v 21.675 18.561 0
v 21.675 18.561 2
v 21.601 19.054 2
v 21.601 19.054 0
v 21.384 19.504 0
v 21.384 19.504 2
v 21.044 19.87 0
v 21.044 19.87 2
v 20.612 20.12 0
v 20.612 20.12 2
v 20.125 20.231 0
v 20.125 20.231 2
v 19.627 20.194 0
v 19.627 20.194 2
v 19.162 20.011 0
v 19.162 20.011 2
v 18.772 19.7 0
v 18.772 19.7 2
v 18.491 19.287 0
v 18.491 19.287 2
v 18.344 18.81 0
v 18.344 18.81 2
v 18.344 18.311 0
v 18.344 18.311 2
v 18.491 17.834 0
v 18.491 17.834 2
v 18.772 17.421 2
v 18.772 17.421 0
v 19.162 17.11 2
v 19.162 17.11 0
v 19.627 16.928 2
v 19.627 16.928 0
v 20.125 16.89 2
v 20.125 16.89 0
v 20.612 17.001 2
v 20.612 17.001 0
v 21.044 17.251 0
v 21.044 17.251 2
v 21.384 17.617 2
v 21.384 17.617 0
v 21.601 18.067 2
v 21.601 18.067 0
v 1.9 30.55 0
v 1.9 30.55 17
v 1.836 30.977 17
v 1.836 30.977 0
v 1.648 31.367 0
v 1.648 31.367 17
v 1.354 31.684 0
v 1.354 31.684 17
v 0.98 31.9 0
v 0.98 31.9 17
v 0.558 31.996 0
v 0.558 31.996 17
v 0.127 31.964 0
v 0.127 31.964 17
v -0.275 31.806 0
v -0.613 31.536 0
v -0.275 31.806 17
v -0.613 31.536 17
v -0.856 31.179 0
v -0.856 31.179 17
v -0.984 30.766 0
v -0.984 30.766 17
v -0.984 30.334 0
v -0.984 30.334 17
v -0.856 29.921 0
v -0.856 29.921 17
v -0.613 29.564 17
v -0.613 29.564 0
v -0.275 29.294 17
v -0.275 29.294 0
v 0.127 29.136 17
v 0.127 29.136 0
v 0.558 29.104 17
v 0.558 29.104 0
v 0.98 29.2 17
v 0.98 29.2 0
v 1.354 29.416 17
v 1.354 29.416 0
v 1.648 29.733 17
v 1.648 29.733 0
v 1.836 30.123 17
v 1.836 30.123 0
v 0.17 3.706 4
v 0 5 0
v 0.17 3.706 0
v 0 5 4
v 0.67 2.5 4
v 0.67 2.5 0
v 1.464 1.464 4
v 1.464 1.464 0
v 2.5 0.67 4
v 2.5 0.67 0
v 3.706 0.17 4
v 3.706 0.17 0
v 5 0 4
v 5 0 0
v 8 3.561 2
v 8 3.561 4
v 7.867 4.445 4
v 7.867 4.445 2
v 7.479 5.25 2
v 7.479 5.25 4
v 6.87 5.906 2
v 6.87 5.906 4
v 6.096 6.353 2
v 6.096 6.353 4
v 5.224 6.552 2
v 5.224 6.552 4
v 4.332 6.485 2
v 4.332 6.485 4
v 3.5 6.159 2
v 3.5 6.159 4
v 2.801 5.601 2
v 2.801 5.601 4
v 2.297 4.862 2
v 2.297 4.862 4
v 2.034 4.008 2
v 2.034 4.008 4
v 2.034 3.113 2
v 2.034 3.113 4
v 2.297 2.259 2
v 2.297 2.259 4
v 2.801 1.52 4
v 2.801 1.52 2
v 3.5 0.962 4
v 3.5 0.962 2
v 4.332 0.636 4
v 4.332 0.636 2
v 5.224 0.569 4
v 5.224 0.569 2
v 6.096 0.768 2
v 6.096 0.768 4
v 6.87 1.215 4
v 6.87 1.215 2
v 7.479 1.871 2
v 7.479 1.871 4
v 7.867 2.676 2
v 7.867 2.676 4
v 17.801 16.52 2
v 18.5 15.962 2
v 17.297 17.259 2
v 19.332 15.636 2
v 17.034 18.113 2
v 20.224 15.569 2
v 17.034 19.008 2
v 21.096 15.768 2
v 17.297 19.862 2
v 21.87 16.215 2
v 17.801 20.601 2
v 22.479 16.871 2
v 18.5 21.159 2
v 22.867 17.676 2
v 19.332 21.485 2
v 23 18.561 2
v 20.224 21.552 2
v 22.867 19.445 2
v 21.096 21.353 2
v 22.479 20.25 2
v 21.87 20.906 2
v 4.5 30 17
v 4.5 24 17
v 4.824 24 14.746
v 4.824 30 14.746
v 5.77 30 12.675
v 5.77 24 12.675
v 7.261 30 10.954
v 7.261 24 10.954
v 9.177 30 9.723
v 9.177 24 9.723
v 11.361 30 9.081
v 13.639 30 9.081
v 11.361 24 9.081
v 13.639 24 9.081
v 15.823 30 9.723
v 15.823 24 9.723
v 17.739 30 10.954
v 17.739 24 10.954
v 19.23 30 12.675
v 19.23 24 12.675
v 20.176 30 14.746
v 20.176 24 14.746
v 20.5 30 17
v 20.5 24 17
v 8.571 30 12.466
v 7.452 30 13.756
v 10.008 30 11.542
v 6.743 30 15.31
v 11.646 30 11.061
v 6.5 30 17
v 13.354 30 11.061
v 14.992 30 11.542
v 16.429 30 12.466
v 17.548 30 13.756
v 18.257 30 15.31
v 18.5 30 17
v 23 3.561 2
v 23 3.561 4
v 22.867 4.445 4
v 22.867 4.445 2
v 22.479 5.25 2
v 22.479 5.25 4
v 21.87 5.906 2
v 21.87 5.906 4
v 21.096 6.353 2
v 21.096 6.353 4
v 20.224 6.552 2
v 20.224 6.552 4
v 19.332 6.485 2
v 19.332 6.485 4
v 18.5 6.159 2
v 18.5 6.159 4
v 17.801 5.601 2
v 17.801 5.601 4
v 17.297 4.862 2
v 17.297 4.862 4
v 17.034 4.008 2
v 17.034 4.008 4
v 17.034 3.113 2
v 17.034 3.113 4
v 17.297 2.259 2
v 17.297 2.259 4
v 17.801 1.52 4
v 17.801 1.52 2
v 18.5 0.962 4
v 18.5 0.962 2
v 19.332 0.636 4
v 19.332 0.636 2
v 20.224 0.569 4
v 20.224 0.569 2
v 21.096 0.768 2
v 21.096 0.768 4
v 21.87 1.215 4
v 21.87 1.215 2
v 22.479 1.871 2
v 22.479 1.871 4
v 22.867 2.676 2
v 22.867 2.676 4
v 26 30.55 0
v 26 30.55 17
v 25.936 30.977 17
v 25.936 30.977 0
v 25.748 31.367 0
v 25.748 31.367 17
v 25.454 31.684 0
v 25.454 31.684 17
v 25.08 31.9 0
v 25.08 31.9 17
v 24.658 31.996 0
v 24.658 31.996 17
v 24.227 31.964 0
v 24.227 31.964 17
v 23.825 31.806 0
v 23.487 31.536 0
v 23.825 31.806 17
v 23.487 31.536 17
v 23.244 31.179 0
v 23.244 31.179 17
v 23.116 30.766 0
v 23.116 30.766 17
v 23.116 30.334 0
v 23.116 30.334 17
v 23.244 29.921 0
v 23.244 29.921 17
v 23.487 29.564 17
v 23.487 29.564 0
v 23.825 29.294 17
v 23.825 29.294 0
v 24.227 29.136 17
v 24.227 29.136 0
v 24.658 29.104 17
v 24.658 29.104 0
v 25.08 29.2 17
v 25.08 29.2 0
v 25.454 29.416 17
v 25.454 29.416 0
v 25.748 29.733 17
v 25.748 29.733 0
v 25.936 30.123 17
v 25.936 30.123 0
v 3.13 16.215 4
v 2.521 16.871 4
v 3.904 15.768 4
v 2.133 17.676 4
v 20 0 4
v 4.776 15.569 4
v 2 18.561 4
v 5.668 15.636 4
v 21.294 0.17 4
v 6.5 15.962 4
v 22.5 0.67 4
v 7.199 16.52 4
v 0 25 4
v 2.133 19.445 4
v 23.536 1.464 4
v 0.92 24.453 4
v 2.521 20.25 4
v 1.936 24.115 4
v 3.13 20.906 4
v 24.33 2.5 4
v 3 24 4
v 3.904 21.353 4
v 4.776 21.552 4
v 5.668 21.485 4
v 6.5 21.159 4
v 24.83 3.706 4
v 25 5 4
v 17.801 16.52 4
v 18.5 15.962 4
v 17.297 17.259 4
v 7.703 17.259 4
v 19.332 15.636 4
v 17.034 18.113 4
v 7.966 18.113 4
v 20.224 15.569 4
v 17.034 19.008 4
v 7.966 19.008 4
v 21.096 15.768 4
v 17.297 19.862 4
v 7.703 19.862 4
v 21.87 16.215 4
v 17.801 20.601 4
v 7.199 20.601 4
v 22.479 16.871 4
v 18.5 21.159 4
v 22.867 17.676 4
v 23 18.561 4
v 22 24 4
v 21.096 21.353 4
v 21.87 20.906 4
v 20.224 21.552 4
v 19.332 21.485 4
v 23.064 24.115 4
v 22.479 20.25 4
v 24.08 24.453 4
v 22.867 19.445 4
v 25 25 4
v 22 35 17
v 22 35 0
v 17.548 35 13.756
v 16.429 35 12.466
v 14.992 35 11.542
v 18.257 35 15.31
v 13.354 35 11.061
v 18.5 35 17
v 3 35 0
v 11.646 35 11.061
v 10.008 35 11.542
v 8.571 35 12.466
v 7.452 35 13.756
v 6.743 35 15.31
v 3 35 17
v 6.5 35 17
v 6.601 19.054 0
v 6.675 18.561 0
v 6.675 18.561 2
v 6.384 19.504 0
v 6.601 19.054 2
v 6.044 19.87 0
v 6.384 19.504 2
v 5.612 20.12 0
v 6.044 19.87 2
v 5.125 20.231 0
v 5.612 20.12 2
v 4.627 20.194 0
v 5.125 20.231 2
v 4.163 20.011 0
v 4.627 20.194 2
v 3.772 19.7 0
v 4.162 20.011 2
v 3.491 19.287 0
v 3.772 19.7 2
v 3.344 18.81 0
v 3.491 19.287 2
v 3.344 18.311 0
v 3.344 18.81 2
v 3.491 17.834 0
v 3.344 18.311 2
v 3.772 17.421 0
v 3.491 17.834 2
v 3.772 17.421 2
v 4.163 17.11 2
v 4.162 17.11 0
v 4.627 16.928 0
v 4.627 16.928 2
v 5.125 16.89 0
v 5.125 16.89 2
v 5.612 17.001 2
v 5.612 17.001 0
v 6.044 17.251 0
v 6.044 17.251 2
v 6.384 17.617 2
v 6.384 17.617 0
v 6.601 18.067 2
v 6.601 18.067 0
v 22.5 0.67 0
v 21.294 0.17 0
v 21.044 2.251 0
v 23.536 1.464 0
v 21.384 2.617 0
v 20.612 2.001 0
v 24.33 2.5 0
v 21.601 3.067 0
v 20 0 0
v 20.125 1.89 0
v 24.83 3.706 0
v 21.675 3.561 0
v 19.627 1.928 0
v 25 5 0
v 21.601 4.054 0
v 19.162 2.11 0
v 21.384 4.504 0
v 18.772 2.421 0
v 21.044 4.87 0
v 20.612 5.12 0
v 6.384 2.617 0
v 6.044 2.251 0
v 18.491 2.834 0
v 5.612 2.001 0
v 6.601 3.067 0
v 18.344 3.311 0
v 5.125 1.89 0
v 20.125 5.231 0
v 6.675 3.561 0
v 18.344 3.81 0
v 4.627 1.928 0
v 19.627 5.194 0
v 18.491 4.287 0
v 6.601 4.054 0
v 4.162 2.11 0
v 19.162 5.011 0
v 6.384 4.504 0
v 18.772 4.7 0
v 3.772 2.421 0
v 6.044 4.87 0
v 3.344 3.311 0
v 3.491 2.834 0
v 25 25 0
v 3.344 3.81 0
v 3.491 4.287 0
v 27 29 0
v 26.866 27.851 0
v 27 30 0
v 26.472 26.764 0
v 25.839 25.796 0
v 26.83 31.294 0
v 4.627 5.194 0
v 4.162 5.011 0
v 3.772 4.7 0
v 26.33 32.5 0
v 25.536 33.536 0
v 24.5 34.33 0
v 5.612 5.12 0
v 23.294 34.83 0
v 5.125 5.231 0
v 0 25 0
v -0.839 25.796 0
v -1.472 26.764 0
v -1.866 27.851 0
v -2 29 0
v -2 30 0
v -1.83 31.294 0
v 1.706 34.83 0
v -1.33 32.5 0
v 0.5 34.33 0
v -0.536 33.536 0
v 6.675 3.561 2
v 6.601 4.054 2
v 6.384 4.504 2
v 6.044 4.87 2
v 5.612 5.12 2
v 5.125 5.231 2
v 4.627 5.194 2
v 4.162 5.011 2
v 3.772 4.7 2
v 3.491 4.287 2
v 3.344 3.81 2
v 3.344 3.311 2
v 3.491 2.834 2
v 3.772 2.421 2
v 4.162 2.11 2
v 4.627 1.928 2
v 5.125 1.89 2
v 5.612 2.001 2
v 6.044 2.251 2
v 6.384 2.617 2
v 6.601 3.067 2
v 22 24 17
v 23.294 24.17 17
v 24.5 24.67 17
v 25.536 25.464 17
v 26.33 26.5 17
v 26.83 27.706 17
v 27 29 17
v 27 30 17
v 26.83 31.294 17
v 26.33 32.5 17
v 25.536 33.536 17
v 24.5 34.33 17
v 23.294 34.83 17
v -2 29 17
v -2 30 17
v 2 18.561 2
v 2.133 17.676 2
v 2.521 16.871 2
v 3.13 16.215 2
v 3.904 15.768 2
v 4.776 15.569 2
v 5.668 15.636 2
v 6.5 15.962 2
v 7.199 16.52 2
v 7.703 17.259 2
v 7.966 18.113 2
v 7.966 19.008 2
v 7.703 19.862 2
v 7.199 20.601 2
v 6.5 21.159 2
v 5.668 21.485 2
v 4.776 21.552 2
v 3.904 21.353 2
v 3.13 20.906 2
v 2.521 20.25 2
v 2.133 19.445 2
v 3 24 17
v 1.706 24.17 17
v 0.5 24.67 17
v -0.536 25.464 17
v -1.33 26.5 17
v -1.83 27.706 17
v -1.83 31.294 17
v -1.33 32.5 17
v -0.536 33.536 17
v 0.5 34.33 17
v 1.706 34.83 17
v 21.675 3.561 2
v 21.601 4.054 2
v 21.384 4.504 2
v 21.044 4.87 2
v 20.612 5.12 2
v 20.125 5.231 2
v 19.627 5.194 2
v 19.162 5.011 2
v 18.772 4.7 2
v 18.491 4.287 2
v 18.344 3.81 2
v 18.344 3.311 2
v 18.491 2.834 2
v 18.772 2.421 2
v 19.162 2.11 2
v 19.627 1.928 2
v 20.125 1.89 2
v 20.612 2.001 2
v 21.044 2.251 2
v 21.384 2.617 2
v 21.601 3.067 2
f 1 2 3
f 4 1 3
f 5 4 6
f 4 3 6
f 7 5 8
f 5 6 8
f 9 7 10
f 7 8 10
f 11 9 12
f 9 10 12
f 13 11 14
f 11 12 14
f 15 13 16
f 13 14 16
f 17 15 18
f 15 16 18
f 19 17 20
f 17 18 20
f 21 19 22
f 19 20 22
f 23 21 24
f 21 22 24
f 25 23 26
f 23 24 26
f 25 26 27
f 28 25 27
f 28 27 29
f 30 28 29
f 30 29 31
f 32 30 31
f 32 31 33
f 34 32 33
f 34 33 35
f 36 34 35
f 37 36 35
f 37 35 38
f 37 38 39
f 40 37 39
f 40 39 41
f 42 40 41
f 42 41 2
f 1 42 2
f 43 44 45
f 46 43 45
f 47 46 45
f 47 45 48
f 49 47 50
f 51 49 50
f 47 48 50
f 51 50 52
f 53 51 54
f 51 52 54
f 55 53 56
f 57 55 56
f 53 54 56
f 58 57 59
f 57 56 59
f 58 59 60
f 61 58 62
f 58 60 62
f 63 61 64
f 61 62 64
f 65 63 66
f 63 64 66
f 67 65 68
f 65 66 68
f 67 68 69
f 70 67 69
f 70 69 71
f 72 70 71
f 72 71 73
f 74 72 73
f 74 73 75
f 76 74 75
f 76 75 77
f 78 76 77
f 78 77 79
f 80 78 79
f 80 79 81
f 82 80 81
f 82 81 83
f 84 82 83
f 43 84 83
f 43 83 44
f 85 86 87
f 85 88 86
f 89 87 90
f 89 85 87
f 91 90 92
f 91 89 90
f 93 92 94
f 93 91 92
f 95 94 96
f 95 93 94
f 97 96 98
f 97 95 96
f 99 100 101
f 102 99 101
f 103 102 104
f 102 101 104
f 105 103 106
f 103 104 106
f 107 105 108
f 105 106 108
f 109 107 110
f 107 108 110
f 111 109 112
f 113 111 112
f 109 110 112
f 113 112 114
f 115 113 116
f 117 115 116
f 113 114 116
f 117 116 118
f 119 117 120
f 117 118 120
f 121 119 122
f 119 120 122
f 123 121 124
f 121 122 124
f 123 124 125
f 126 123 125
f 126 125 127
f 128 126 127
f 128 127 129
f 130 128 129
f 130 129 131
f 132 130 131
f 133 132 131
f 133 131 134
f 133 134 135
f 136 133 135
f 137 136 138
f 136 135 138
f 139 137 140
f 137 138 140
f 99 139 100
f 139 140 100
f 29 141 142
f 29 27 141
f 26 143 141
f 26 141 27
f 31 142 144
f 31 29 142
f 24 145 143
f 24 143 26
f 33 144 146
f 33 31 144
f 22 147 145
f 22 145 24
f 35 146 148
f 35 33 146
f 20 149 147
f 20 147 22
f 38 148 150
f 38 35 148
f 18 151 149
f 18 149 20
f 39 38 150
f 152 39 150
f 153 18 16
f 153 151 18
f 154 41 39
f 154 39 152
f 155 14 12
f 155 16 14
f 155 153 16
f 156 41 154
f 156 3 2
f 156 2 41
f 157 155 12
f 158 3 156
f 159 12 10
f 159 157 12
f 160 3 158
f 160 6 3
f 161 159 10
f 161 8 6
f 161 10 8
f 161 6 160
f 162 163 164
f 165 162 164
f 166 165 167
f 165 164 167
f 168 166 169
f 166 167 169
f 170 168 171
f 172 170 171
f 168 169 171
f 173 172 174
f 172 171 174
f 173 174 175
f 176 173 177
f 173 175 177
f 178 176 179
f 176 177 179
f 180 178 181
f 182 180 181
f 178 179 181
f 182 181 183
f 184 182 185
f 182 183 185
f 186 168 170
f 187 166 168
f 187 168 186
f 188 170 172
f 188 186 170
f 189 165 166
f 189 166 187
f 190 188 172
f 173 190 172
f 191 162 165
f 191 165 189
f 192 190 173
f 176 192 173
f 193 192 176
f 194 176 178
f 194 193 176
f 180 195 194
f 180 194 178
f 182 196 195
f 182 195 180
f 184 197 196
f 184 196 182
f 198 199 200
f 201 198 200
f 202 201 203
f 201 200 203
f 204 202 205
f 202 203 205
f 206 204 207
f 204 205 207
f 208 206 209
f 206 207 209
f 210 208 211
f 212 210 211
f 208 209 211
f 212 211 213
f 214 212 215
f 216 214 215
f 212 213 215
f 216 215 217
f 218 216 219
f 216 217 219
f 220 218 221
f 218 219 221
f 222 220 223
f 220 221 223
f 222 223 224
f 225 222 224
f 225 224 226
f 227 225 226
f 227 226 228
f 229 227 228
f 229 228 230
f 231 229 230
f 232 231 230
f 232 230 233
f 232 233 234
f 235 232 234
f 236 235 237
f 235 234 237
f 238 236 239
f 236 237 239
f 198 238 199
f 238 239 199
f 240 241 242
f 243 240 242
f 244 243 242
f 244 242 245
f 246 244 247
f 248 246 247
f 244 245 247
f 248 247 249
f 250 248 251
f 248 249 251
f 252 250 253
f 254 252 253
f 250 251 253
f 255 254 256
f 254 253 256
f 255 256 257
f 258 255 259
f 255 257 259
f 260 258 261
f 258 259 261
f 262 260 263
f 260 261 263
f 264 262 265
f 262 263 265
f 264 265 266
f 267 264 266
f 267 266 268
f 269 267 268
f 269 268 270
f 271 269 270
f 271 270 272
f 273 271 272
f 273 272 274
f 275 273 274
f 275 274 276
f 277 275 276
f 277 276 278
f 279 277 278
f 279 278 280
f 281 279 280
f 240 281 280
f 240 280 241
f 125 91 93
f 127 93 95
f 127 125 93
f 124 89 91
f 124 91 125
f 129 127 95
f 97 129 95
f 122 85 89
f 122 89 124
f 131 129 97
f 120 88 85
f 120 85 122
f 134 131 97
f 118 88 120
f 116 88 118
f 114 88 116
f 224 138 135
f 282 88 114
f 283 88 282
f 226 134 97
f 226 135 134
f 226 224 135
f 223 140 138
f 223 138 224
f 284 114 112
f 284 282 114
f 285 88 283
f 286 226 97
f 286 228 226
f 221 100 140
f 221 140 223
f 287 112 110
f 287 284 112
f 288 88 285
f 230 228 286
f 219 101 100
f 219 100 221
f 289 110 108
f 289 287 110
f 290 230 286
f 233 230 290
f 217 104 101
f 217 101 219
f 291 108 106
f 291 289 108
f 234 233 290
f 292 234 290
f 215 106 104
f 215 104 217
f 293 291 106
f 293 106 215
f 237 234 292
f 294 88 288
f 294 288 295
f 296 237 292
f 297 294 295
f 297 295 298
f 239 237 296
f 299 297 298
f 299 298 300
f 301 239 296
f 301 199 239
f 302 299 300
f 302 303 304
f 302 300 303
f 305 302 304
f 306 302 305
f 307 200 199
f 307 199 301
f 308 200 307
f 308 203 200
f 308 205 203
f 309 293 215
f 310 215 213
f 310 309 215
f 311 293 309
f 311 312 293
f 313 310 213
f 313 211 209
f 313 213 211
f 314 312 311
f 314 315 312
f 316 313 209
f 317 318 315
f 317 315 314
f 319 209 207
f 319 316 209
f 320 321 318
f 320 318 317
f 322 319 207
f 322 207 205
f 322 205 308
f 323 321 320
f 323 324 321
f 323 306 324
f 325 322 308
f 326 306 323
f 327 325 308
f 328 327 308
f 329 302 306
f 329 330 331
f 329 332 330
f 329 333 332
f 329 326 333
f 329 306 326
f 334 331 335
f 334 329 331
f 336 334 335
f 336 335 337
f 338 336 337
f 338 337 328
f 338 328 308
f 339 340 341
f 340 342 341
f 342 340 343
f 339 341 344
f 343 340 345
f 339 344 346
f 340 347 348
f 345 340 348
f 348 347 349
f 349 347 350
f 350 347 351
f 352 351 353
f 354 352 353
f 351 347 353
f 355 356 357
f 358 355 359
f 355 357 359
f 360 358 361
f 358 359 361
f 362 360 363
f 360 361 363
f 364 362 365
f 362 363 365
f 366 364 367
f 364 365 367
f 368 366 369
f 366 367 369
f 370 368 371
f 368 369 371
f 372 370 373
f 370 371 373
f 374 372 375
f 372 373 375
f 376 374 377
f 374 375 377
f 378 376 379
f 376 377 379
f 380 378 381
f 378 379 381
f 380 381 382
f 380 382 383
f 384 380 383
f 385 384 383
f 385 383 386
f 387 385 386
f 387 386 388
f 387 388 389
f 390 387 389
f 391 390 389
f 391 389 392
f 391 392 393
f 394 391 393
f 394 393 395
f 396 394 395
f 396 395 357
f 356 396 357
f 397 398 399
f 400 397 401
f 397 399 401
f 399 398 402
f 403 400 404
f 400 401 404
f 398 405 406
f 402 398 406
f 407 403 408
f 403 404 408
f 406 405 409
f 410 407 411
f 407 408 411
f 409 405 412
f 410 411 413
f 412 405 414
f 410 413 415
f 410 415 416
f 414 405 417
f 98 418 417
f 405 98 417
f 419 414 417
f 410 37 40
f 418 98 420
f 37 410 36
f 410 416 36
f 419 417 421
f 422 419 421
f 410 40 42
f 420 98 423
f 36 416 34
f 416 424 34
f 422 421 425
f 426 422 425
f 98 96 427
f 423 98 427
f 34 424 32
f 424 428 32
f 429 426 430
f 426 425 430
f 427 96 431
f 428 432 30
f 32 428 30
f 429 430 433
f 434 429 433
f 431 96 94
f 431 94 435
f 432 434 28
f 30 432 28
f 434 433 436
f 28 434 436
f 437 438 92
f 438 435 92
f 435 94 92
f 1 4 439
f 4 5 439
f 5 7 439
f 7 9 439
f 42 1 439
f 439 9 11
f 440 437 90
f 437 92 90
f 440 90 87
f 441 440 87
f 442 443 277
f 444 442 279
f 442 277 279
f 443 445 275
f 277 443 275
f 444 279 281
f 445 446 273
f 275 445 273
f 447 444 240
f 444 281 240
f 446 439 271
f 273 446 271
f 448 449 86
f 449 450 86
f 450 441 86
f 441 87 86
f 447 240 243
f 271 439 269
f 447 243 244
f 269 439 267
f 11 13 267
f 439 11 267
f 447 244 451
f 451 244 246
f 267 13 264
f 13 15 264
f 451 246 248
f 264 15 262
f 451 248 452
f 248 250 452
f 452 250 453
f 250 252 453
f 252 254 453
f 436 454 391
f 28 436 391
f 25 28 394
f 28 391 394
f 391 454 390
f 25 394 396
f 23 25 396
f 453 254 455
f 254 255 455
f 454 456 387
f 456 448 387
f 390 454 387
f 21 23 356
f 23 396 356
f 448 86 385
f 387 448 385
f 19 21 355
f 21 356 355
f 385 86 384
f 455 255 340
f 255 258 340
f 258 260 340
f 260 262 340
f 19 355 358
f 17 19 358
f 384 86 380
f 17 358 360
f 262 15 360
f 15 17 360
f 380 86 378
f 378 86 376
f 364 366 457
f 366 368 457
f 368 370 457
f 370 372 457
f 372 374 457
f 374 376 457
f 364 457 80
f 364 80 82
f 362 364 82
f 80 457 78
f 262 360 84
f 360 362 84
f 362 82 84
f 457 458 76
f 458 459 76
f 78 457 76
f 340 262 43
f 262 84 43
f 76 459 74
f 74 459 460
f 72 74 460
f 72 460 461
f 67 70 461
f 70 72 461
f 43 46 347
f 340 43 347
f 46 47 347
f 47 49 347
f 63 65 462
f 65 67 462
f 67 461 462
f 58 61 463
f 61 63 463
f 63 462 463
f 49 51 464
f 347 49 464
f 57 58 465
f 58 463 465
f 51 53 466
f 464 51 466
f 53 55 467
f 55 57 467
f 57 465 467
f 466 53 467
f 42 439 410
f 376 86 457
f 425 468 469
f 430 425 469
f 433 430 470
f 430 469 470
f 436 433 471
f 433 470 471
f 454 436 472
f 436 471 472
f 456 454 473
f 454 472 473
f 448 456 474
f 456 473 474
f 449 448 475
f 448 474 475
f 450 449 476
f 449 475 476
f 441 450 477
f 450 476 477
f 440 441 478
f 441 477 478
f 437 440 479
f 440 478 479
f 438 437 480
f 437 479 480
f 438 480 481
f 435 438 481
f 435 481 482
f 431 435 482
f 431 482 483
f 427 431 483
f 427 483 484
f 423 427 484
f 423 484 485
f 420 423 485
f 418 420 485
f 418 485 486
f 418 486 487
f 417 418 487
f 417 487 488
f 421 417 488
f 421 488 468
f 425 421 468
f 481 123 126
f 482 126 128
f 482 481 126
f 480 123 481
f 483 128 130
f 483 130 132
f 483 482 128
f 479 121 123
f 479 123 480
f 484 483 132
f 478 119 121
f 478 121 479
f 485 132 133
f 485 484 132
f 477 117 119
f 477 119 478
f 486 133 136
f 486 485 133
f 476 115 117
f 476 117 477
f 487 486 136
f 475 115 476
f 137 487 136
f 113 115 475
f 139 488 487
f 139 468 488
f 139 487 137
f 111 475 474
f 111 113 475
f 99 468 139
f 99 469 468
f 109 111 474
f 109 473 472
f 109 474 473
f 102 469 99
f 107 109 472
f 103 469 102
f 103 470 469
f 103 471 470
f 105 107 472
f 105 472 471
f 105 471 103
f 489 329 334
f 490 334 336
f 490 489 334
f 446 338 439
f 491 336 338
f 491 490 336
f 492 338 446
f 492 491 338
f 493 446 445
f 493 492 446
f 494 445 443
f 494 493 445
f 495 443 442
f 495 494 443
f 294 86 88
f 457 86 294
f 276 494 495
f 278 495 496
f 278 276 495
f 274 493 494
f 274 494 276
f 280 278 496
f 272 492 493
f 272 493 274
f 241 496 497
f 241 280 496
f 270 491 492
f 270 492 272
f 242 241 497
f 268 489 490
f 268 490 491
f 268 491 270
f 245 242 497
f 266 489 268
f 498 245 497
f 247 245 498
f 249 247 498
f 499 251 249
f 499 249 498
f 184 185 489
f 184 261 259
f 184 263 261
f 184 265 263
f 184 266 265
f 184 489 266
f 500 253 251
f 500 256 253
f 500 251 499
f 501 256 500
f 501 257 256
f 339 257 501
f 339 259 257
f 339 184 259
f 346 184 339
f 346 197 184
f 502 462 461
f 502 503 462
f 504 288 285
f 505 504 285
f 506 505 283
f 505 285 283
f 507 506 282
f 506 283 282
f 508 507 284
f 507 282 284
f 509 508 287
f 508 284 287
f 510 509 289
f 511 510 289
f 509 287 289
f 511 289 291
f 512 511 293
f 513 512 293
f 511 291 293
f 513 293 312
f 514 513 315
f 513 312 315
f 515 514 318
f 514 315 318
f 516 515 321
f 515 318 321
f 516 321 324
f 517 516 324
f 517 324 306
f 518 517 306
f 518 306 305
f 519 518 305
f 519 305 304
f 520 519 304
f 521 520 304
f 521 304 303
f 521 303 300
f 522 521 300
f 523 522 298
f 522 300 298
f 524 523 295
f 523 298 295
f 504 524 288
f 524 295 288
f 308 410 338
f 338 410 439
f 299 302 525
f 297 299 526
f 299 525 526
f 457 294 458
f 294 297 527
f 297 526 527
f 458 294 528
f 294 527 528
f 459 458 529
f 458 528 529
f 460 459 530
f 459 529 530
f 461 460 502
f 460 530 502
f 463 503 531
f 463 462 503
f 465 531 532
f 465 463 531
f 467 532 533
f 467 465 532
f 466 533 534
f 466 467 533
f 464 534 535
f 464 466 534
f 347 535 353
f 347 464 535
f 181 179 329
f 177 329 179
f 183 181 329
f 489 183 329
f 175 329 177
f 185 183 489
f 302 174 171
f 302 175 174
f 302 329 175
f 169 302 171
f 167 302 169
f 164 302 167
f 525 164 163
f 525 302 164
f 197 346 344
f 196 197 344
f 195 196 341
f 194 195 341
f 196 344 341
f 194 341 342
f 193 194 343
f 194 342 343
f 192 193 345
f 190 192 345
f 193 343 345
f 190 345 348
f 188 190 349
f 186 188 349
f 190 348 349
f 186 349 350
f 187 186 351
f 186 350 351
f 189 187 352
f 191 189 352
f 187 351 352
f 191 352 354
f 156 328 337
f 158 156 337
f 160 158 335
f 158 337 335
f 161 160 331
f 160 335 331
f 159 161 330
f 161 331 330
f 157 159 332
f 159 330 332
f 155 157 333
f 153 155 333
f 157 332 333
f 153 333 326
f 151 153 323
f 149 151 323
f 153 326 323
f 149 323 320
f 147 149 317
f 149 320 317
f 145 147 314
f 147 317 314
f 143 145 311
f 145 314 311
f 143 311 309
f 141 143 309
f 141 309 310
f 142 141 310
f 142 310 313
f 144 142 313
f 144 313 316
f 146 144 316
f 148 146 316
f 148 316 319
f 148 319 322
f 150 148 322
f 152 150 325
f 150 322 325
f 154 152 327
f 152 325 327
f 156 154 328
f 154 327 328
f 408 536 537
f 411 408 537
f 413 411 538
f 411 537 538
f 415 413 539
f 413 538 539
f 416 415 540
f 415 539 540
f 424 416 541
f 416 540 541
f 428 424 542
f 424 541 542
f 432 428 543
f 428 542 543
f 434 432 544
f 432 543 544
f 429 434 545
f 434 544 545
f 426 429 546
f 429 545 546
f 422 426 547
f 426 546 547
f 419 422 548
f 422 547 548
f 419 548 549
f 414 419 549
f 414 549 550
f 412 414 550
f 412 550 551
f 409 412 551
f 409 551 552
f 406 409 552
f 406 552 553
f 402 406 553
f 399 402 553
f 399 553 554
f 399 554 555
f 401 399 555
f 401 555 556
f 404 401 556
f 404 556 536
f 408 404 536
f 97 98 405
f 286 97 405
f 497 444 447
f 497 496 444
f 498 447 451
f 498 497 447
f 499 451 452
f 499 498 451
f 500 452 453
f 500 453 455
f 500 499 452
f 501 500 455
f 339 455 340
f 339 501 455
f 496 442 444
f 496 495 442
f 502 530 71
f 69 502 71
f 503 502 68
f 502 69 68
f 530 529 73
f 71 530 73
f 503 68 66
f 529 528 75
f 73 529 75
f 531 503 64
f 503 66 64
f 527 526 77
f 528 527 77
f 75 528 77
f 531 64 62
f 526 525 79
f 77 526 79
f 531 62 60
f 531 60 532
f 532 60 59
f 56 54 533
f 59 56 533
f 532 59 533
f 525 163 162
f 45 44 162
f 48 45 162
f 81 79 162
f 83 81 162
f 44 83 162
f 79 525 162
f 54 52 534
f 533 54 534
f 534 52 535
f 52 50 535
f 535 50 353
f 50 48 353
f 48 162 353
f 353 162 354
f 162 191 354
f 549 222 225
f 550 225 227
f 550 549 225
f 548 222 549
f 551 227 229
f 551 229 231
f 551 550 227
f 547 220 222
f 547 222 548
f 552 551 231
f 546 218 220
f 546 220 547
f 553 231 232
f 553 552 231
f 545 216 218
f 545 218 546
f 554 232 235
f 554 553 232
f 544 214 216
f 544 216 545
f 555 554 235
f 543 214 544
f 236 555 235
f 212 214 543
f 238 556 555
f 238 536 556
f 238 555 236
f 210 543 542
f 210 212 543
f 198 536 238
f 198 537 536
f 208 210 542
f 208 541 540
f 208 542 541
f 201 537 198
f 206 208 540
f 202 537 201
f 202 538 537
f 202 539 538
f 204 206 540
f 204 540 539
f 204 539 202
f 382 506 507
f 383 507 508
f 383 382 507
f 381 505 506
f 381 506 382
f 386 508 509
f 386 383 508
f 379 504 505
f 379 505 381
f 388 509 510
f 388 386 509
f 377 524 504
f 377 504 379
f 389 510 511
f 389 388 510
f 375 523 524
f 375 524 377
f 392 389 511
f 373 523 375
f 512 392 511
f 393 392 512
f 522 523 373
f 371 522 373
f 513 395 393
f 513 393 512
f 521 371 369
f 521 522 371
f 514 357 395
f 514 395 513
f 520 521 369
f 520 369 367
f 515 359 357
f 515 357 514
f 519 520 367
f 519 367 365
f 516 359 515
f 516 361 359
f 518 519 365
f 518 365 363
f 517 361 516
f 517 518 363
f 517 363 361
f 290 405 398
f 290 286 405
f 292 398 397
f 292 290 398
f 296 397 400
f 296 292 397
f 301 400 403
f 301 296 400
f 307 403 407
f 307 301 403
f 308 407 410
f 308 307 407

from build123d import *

# Parameters (mm, degrees)
F0_W      = 25
F0_H      = 35
F1_DEPTH  = 4
F2_R      = 1.675
F3_DEPTH  = 25
F4_W      = 25
F4_H      = 11
F5_DEPTH  = 13
F7_DEPTH  = 6
F8_R      = 8
F9_DEPTH  = 6
F2_R_2    = 3
F10_DEPTH = 2
F11_R     = 5
F13_DEPTH = 2
F14_W     = 11
F14_H     = 17
F15_DEPTH = 2
F16_R     = 1.45
F17_DEPTH = 25
F18_R     = 5


with BuildPart() as f1:
    # F0 (on Top) → F1 (new body)
    with BuildSketch(Plane.XY):
        with Locations((12.5, 17.5)):
            Rectangle(F0_W, F0_H)
    extrude(amount=F1_DEPTH)

    # F2 (on face) → F3 (cut)
    with BuildSketch(Plane.XY.offset(4)):
        with BuildLine():
            ThreePointArc((3.325, 18.5605346784), (5, 16.8855346784), (6.675, 18.5605346784))
            ThreePointArc((6.675, 18.5605346784), (5, 20.2355346784), (3.325, 18.5605346784))
        make_face()
        with Locations((20, 18.5605346784)):
            Circle(F2_R)
        with Locations((20, 3.5605346784)):
            Circle(F2_R)
        with Locations((5, 3.5605346784)):
            Circle(F2_R)
    extrude(amount=-F3_DEPTH, mode=Mode.SUBTRACT)

    # F4 (on face) → F5 (join)
    with BuildSketch(Plane.XY.offset(4)):
        with Locations((12.5, 29.5)):
            Rectangle(F4_W, F4_H)
    extrude(amount=F5_DEPTH)

    # F6 (on face) → F7 (cut)
    with BuildSketch(Plane(origin=(0, 35, 0), x_dir=(-1, 0, 0), z_dir=(0, 1, 0))):
        with BuildLine():
            ThreePointArc((-18.5, 17), (-12.5, 11), (-6.5, 17))
            Line((-6.5, 17), (-18.5, 17))
        make_face()
    extrude(amount=-F7_DEPTH, mode=Mode.SUBTRACT)

    # F8 (on face) → F9 (cut)
    with BuildSketch(Plane.XZ.offset(-24)):
        with Locations((12.5, 17)):
            Circle(F8_R)
    extrude(amount=-F9_DEPTH, mode=Mode.SUBTRACT)

    # F2 (on face) → F10 (cut)
    with BuildSketch(Plane.XY.offset(4)):
        with BuildLine():
            ThreePointArc((8, 18.5605346784), (5, 21.5605346784), (2, 18.5605346784))
            ThreePointArc((2, 18.5605346784), (5, 15.5605346784), (8, 18.5605346784))
        make_face()
        with BuildLine():
            ThreePointArc((3.325, 18.5605346784), (5, 20.2355346784), (6.675, 18.5605346784))
            ThreePointArc((6.675, 18.5605346784), (5, 16.8855346784), (3.325, 18.5605346784))
        make_face(mode=Mode.SUBTRACT)
        with Locations((20, 18.5605346784)):
            Circle(F2_R_2)
        with Locations((20, 18.5605346784)):
            Circle(F2_R, mode=Mode.SUBTRACT)
        with Locations((20, 3.5605346784)):
            Circle(F2_R_2)
        with Locations((20, 3.5605346784)):
            Circle(F2_R, mode=Mode.SUBTRACT)
        with Locations((5, 3.5605346784)):
            Circle(F2_R_2)
        with Locations((5, 3.5605346784)):
            Circle(F2_R, mode=Mode.SUBTRACT)
    extrude(amount=-F10_DEPTH, mode=Mode.SUBTRACT)

    # F11
    f11_edges = [f1.edges().sort_by_distance(p)[0] for p in [
        (0, 0, 2),
        (25, 0, 2),
    ]]
    fillet(f11_edges, radius=F11_R)

    # F12 (on face) + F5_face3 (on face) → F13 (join)
    with BuildSketch(Plane(origin=(0, 0, 0), x_dir=(0, -1, 0), z_dir=(-1, 0, 0))):
        Polygon((-35, 17), (-35, 0), (-24, 0), (-24, 4), (-24, 17), align=None)
    with BuildSketch(Plane(origin=(25, 25.1653992395, 6.6216730038), x_dir=(0, 1, 0), z_dir=(1, 0, 0))):
        Polygon((-1.1653992395, -2.6216730038), (-20.1653992395, -2.6216730038), (-20.1653992395, -6.6216730038), (9.8346007605, -6.6216730038), (9.8346007605, 10.3783269962), (-1.1653992395, 10.3783269962), align=None)
    extrude(amount=F13_DEPTH, dir=(-1, 0, 0))

    # F14 (on face) → F15 (join)
    with BuildSketch(Plane.YZ.offset(25)):
        with Locations((29.5, 8.5)):
            Rectangle(F14_W, F14_H)
    extrude(amount=F15_DEPTH)

    # F16 (on face) → F17 (cut)
    with BuildSketch(Plane.XY.offset(17)):
        with Locations((0.45, 30.55)):
            Circle(F16_R)
        with Locations((24.55, 30.55)):
            Circle(F16_R)
    extrude(amount=-F17_DEPTH, mode=Mode.SUBTRACT)

    # F18
    f18_edges = [f1.edges().sort_by_distance(p)[0] for p in [
        (-2, 24, 8.5),
        (-2, 35, 8.5),
        (27, 35, 8.5),
        (27, 24, 8.5),
    ]]
    fillet(f18_edges, radius=F18_R)


solid = f1.part
